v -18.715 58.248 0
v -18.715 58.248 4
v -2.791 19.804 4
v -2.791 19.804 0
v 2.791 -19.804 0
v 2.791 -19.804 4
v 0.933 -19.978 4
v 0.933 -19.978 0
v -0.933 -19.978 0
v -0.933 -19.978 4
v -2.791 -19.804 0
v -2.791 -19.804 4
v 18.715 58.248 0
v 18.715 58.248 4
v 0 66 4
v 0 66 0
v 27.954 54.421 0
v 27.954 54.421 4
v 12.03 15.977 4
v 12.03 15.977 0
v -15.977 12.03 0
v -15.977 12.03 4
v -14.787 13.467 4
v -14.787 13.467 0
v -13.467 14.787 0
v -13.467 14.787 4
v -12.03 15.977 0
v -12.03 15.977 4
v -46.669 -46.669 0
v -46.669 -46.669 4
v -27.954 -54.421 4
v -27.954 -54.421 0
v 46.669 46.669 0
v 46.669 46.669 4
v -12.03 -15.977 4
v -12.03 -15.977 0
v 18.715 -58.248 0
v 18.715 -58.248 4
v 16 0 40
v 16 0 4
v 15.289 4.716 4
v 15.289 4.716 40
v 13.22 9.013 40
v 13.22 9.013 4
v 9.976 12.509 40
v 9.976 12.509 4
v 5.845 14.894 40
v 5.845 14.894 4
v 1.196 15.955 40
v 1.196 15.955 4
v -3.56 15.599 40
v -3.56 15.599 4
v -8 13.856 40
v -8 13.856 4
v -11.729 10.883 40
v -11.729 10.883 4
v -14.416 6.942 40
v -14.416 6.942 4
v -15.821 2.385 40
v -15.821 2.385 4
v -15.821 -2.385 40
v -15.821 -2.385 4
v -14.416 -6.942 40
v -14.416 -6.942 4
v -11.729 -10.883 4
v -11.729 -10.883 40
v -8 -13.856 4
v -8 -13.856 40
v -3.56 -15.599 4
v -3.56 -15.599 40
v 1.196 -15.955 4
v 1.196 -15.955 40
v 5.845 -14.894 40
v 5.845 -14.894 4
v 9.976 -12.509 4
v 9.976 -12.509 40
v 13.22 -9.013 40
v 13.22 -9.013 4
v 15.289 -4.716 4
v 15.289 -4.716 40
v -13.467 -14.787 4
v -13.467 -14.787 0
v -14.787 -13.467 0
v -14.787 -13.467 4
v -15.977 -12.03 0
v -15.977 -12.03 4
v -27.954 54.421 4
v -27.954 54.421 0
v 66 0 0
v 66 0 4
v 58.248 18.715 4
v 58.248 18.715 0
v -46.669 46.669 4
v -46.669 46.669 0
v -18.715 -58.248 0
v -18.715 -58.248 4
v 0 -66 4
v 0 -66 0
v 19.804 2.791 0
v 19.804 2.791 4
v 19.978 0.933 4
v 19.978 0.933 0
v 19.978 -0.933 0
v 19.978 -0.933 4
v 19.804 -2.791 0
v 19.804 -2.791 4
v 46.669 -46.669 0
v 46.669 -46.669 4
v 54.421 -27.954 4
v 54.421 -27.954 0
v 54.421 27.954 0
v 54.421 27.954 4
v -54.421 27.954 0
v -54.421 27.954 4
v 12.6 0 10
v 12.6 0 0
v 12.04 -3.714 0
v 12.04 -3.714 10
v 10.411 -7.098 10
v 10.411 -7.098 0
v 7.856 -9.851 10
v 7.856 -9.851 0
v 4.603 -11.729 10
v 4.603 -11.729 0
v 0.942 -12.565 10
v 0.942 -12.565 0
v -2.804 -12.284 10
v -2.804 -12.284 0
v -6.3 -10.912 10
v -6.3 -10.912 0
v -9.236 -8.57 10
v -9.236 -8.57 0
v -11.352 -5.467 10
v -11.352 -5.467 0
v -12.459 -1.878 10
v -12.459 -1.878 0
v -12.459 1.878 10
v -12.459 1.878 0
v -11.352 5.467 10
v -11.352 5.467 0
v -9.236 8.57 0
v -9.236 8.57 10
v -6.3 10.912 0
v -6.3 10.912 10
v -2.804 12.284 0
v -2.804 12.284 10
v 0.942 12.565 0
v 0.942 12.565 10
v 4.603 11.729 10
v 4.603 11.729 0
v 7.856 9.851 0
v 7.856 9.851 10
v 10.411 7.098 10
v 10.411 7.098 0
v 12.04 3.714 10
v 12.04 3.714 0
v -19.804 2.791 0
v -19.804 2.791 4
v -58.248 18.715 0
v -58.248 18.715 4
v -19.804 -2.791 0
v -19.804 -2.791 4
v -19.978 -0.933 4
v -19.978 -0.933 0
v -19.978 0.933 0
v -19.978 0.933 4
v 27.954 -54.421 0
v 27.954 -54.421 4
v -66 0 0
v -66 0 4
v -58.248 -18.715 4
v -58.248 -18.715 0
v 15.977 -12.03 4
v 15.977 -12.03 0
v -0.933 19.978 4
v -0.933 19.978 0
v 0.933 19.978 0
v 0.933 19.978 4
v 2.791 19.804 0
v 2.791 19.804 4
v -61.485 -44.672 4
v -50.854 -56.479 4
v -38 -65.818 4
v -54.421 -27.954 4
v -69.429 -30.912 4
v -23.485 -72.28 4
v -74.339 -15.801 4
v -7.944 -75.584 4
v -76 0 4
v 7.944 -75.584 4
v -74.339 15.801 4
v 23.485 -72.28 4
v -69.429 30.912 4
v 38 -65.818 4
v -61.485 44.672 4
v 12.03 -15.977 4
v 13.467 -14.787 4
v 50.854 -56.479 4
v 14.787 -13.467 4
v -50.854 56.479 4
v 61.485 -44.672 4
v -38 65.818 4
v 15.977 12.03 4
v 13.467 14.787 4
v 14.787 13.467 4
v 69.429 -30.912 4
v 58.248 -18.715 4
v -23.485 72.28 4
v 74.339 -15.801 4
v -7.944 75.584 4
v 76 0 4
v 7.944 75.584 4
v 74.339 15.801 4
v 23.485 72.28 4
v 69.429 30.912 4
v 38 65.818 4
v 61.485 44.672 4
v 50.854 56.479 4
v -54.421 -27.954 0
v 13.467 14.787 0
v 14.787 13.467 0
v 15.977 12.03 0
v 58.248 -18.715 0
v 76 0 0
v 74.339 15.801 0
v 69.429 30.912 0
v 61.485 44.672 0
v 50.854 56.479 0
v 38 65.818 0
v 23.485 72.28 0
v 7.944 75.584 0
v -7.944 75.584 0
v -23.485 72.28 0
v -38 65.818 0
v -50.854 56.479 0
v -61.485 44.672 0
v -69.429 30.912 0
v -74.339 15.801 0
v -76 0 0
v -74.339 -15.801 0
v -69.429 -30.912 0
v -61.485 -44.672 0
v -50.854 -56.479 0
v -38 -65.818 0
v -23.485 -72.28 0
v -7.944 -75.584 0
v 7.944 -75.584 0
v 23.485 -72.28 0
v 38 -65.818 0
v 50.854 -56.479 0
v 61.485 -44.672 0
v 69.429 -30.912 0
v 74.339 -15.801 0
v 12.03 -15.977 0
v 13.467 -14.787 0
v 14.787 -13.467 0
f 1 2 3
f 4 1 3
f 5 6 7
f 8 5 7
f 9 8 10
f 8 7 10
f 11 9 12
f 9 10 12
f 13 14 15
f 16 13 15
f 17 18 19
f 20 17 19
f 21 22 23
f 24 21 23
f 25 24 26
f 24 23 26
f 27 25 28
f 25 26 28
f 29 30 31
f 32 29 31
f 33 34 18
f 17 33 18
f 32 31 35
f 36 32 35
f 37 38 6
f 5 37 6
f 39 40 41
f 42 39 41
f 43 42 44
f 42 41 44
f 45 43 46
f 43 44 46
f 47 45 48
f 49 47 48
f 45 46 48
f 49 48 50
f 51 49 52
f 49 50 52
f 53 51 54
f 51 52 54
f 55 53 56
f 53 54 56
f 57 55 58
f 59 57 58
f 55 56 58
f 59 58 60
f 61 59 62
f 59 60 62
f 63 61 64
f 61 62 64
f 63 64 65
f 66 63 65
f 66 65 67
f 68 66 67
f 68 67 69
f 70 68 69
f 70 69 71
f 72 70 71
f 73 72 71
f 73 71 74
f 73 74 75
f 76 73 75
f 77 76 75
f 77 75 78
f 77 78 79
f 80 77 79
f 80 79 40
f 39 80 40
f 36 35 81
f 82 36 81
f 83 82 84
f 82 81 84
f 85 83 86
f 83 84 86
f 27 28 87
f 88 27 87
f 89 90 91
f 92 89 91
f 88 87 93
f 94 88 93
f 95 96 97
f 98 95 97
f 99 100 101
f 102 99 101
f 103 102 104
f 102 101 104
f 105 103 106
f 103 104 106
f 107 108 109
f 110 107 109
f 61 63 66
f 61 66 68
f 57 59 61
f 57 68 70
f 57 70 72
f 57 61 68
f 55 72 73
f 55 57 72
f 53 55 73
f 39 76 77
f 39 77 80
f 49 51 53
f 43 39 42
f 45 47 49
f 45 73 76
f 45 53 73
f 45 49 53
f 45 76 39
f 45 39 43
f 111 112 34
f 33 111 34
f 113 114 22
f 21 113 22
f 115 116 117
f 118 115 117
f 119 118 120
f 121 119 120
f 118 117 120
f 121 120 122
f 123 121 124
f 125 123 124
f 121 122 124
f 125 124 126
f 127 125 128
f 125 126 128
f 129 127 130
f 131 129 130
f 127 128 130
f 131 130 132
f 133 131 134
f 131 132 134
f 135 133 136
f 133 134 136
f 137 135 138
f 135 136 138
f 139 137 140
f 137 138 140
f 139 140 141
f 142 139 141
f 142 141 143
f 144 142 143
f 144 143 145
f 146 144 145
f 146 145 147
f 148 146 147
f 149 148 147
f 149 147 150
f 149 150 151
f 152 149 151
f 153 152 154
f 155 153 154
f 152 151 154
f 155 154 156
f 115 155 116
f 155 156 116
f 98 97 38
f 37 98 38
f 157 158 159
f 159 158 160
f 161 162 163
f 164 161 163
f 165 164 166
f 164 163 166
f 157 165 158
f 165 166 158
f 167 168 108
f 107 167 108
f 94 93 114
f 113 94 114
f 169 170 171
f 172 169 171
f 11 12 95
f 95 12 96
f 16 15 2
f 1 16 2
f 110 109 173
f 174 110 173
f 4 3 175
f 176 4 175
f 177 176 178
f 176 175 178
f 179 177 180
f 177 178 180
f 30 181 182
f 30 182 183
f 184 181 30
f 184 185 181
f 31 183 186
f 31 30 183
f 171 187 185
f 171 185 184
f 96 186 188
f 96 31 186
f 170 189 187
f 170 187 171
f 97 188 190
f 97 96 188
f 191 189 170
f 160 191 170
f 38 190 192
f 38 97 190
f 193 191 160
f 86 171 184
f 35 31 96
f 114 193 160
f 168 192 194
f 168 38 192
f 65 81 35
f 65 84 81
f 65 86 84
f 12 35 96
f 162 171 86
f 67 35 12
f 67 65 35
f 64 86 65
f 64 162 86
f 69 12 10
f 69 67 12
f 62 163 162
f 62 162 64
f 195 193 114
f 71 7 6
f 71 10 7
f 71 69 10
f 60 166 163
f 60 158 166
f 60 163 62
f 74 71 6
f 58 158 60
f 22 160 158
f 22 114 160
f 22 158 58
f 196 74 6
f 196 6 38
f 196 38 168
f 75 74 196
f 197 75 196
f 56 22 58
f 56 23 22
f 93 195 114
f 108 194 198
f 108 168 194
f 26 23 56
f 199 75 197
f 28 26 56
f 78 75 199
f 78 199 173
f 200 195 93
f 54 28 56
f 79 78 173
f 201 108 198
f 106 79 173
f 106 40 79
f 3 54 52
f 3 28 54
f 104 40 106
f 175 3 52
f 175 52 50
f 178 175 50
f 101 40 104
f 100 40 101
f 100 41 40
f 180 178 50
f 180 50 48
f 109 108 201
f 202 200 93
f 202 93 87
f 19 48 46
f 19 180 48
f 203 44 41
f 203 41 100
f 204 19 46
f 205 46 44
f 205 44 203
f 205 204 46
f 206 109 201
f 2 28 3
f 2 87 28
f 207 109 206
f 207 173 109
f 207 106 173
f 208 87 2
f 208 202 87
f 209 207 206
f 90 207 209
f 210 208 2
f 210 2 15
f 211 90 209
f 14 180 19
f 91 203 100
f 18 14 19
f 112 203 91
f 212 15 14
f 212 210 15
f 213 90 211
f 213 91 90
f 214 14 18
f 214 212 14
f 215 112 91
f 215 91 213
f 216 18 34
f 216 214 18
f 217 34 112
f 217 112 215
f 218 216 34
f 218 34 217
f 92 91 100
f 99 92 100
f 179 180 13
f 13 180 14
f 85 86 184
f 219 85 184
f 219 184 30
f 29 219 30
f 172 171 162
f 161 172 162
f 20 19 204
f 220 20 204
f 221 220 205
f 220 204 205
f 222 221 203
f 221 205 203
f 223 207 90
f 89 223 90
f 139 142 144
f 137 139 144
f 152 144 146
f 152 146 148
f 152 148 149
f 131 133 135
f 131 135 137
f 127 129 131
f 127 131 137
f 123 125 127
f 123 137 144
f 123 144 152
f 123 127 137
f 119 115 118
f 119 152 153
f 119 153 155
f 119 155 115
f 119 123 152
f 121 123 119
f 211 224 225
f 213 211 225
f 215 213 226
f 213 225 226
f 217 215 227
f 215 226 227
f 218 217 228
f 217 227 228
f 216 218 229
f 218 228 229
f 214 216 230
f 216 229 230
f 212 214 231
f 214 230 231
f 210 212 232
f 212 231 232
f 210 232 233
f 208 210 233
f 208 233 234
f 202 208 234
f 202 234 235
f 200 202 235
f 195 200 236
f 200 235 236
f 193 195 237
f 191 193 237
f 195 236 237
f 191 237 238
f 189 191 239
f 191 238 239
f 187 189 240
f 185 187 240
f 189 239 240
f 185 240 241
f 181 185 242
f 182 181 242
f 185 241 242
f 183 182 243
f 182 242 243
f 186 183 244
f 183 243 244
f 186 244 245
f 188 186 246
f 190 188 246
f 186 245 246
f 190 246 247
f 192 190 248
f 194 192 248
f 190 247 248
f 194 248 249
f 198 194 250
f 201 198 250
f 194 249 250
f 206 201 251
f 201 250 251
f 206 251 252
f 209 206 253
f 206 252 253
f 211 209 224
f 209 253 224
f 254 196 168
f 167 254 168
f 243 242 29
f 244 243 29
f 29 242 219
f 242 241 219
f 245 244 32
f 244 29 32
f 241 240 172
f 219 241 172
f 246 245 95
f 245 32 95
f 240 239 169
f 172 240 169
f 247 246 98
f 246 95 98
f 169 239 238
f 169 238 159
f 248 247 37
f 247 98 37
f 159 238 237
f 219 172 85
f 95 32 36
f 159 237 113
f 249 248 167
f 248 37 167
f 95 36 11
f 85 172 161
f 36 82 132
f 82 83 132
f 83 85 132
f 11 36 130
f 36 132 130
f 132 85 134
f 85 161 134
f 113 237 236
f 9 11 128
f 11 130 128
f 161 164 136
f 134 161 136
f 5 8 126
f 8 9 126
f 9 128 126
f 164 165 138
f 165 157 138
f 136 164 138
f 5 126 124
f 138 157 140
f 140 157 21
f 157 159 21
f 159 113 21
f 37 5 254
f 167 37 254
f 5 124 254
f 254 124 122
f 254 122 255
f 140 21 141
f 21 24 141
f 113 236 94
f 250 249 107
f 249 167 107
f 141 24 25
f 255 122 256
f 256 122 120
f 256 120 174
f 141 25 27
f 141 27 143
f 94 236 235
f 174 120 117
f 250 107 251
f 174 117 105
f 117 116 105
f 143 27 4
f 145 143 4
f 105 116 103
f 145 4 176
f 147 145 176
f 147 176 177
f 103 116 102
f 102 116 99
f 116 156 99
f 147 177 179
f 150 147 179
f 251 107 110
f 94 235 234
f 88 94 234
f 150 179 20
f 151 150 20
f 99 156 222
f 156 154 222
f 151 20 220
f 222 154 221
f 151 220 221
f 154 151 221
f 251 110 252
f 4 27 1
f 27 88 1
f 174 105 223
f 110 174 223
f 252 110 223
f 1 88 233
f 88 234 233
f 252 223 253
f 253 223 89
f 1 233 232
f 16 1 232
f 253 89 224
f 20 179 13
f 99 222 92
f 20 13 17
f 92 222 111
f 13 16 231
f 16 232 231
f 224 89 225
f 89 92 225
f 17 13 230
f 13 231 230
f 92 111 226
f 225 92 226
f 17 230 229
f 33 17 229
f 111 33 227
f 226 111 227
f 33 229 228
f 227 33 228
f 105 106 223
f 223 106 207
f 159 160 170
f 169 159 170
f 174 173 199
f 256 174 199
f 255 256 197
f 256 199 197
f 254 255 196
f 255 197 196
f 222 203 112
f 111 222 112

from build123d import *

# Parameters (mm, degrees)
F0_R     = 16
F1_DEPTH = 40
F2_R     = 12.6
F3_DEPTH = 10
F4_R     = 76
F4_R_2   = 16
F5_DEPTH = 4
F7_DEPTH = 4


with BuildPart() as f1:
    # F0 (on Top) → F1 (new body)
    with BuildSketch(Plane.XY):
        Circle(F0_R)
    extrude(amount=F1_DEPTH)

    # F2 (on face) → F3 (cut)
    with BuildSketch(Plane(origin=(0, 0, 0), x_dir=(1, 0, 0), z_dir=(0, 0, -1))):
        Circle(F2_R)
    extrude(amount=-F3_DEPTH, mode=Mode.SUBTRACT)

    # F4 (on Top) → F5 (join)
    with BuildSketch(Plane.XY):
        Circle(F4_R)
        Circle(F4_R_2, mode=Mode.SUBTRACT)
    extrude(amount=F5_DEPTH)

    # F6 (on face) → F7 (cut, through all)
    with BuildSketch(Plane.XY.offset(4)):
        with BuildLine():
            Line((27.953921, -54.421107), (46.669048, -46.669048))
            Line((46.669048, -46.669048), (54.421107, -27.953921))
            Line((54.421107, -27.953921), (15.977433, -12.03003))
            ThreePointArc((15.977433, -12.03003), (14.142136, -14.142136), (12.03003, -15.977433))
            Line((12.03003, -15.977433), (27.953921, -54.421107))
        make_face()
        with BuildLine():
            Line((-18.715126, -58.247941), (0, -66))
            Line((0, -66), (18.715126, -58.247941))
            Line((18.715126, -58.247941), (2.791235, -19.804267))
            ThreePointArc((2.791235, -19.804267), (0, -20), (-2.791235, -19.804267))
            Line((-2.791235, -19.804267), (-18.715126, -58.247941))
        make_face()
        with BuildLine():
            Line((-54.421107, -27.953921), (-46.669048, -46.669048))
            Line((-46.669048, -46.669048), (-27.953921, -54.421107))
            Line((-27.953921, -54.421107), (-12.03003, -15.977433))
            ThreePointArc((-12.03003, -15.977433), (-14.142136, -14.142136), (-15.977433, -12.03003))
            Line((-15.977433, -12.03003), (-54.421107, -27.953921))
        make_face()
        with BuildLine():
            Line((-58.247941, 18.715126), (-66, 0))
            Line((-66, 0), (-58.247941, -18.715126))
            Line((-58.247941, -18.715126), (-19.804267, -2.791235))
            ThreePointArc((-19.804267, -2.791235), (-20, 0), (-19.804267, 2.791235))
            Line((-19.804267, 2.791235), (-58.247941, 18.715126))
        make_face()
        with BuildLine():
            Line((-27.953921, 54.421107), (-46.669048, 46.669048))
            Line((-46.669048, 46.669048), (-54.421107, 27.953921))
            Line((-54.421107, 27.953921), (-15.977433, 12.03003))
            ThreePointArc((-15.977433, 12.03003), (-14.142136, 14.142136), (-12.03003, 15.977433))
            Line((-12.03003, 15.977433), (-27.953921, 54.421107))
        make_face()
        with BuildLine():
            Line((18.715126, 58.247941), (0, 66))
            Line((0, 66), (-18.715126, 58.247941))
            Line((-18.715126, 58.247941), (-2.791235, 19.804267))
            ThreePointArc((-2.791235, 19.804267), (0, 20), (2.791235, 19.804267))
            Line((2.791235, 19.804267), (18.715126, 58.247941))
        make_face()
        with BuildLine():
            Line((54.421107, 27.953921), (46.669048, 46.669048))
            Line((46.669048, 46.669048), (27.953921, 54.421107))
            Line((27.953921, 54.421107), (12.03003, 15.977433))
            ThreePointArc((12.03003, 15.977433), (14.142136, 14.142136), (15.977433, 12.03003))
            Line((15.977433, 12.03003), (54.421107, 27.953921))
        make_face()
        with BuildLine():
            Line((58.247941, -18.715126), (66, 0))
            Line((66, 0), (58.247941, 18.715126))
            Line((58.247941, 18.715126), (19.804267, 2.791235))
            ThreePointArc((19.804267, 2.791235), (20, 0), (19.804267, -2.791235))
            Line((19.804267, -2.791235), (58.247941, -18.715126))
        make_face()
    extrude(amount=-F7_DEPTH, mode=Mode.SUBTRACT)


solid = f1.part
